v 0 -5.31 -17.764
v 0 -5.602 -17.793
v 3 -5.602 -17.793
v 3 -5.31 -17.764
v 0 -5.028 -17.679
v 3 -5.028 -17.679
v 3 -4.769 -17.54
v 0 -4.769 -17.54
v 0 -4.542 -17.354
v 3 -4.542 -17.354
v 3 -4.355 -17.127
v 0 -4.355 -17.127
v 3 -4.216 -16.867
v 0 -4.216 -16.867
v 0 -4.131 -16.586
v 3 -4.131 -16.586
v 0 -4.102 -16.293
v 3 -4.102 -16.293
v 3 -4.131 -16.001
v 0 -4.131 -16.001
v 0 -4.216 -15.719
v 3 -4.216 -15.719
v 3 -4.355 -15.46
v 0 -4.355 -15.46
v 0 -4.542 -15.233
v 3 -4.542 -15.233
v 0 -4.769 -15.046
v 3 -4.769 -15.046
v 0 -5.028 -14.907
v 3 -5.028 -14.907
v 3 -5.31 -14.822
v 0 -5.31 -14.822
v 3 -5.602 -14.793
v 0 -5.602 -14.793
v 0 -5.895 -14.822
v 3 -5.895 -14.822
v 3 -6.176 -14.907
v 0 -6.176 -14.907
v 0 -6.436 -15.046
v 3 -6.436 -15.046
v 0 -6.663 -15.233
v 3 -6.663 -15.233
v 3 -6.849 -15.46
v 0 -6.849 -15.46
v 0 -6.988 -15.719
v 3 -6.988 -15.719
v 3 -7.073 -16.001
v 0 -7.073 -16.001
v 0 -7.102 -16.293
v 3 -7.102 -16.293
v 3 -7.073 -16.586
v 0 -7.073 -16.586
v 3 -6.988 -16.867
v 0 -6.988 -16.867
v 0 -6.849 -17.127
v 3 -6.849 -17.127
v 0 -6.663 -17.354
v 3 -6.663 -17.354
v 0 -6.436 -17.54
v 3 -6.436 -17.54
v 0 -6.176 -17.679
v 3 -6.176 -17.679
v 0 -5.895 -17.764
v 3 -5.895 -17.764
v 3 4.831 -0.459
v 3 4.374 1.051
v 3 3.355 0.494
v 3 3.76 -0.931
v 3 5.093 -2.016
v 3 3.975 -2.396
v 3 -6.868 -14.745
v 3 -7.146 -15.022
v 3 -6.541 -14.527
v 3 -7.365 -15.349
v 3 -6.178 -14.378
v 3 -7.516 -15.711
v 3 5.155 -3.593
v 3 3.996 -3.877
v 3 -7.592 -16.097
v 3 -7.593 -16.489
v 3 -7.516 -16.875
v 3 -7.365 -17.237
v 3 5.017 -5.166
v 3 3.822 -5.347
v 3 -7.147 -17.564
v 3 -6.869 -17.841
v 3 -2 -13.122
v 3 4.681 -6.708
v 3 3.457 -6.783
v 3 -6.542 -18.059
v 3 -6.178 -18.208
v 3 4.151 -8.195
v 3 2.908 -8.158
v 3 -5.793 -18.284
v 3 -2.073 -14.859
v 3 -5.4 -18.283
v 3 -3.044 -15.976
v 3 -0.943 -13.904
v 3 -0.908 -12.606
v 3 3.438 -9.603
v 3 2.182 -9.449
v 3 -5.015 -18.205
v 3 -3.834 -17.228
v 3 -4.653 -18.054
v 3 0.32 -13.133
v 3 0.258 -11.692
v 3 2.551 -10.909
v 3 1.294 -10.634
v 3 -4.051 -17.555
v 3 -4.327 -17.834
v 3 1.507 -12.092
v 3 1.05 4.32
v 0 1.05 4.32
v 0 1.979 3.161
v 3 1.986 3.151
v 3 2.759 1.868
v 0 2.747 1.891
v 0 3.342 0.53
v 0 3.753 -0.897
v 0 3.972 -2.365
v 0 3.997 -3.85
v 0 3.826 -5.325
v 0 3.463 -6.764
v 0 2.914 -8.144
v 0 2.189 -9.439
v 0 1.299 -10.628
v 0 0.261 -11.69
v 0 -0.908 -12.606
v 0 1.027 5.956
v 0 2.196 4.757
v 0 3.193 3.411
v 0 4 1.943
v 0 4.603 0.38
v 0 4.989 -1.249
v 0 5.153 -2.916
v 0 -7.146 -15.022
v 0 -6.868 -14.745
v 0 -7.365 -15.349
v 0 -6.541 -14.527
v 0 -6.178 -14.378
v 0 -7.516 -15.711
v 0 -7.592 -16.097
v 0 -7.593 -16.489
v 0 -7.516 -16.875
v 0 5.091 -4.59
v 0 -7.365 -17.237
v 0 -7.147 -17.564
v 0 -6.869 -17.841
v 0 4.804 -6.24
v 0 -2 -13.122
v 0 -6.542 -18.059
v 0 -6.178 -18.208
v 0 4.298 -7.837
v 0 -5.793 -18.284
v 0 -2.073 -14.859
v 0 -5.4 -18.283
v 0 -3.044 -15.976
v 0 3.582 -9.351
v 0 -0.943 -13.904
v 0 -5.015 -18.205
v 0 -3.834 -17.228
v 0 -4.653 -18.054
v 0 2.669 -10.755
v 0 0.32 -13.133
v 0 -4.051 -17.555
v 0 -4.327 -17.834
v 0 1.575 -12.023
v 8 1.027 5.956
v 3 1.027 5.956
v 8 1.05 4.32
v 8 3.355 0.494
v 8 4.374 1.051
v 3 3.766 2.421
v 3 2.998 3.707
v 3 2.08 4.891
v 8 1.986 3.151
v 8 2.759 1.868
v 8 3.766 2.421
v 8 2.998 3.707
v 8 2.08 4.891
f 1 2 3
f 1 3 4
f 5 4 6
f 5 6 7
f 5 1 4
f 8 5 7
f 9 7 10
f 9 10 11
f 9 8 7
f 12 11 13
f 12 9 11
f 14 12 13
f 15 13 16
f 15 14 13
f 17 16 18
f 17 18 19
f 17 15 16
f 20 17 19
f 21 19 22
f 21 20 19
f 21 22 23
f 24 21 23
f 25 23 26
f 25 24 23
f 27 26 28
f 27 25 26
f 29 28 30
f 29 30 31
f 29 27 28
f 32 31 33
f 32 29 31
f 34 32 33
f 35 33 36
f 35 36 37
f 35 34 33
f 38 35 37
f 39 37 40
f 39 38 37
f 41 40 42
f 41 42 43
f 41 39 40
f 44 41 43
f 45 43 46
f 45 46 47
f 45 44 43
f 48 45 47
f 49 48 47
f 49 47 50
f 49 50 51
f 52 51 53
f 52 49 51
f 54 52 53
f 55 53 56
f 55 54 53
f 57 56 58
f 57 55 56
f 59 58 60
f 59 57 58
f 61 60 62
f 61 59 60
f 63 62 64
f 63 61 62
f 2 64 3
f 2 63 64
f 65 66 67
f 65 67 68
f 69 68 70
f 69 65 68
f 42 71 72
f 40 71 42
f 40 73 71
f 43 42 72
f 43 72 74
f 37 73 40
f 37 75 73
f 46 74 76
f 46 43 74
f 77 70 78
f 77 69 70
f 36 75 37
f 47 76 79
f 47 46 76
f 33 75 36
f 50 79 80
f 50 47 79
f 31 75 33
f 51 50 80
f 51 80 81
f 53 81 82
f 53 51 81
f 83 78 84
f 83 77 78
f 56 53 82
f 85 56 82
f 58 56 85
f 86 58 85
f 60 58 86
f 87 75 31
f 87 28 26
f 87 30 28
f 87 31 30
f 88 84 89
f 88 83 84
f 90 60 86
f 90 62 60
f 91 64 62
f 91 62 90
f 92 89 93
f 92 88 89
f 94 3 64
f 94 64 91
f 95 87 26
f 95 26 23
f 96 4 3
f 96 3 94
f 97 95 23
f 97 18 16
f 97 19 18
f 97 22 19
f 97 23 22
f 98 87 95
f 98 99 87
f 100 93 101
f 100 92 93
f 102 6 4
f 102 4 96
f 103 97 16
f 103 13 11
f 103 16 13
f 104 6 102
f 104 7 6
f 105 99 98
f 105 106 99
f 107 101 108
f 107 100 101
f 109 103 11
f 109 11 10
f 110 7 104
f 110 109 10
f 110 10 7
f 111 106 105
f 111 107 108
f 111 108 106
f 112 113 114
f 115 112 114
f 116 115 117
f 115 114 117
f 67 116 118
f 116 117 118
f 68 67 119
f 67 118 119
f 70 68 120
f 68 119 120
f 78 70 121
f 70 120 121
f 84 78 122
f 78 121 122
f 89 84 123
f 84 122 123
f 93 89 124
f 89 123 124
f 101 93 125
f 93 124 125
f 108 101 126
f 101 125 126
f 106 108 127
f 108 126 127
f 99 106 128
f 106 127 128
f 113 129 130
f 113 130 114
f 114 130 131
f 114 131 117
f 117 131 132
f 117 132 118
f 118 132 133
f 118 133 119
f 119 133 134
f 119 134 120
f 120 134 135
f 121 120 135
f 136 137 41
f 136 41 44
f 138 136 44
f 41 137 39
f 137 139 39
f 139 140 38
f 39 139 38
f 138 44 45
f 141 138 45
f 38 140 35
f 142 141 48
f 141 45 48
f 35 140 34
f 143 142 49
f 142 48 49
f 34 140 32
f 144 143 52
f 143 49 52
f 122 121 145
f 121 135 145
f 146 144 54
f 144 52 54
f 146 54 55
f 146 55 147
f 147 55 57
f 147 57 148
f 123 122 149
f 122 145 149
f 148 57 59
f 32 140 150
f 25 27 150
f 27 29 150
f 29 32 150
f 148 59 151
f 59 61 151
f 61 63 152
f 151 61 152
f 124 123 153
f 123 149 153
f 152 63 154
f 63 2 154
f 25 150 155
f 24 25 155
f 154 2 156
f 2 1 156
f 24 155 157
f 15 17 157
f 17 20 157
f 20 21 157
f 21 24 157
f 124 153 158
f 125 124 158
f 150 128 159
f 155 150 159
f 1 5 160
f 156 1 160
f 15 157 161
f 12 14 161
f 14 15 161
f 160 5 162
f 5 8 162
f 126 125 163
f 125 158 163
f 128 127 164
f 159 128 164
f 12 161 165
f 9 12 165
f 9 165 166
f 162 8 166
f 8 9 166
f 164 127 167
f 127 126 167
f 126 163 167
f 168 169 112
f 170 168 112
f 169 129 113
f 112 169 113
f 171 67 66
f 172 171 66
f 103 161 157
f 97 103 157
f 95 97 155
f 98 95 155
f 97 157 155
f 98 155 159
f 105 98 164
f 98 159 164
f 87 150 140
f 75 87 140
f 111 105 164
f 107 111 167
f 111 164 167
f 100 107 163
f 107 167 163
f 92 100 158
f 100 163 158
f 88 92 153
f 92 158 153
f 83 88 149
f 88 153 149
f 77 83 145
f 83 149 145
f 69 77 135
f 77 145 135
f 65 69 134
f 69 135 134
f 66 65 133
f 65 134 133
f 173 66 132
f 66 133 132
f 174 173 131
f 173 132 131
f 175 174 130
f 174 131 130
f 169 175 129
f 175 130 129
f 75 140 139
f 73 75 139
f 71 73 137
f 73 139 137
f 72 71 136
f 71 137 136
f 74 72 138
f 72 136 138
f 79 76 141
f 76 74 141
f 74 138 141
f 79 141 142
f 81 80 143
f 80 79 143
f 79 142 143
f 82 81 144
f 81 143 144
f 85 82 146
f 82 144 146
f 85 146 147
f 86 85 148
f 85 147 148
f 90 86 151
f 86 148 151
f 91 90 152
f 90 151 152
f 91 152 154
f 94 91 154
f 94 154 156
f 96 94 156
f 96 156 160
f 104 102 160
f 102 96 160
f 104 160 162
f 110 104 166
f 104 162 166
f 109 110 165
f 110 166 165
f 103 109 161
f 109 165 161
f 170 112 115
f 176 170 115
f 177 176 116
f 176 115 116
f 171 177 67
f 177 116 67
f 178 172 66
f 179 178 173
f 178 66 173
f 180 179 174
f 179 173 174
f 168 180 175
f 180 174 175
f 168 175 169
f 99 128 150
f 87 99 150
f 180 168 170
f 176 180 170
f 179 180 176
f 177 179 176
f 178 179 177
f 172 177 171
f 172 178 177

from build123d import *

# Parameters (mm, degrees)
SKETCH8_R           = 1.5
BOSS_EXTRUDE3_DEPTH = 3
BOSS_EXTRUDE4_DEPTH = 5


with BuildPart() as part:
    # Sketch8 → Boss-Extrude3 (new body)
    with BuildSketch(Plane(origin=(0, 0, 0), x_dir=(0, 0, -1), z_dir=(1, 0, 0))):
        with BuildLine():
            ThreePointArc((13.132863069, 0.320027848), (3.75419069, 5.150346209), (-5.956033277, 1.026874177))
            Line((-5.956033277, 1.026874177), (-4.319797484, 1.050447619))
            ThreePointArc((-4.319797484, 1.050447619), (4.590085283, 3.936033014), (12.605766771, -0.907670556))
            Line((12.605766771, -0.907670556), (13.12184584, -1.999779955))
            Line((13.12184584, -1.999779955), (14.377901927, -6.177963459))
            ThreePointArc((14.377901927, -6.177963459), (17.56376003, -7.146759051), (17.227616297, -3.83386543))
            ThreePointArc((17.227616297, -3.83386543), (14.859483295, -2.073108487), (13.132863069, 0.320027848))
        make_face()
        with Locations((16.293226017, -5.602173889)):
            Circle(SKETCH8_R, mode=Mode.SUBTRACT)
    extrude(amount=BOSS_EXTRUDE3_DEPTH)

    # Sketch10 → Boss-Extrude4 (add)
    with BuildSketch(Plane(origin=(3, 0, 0), x_dir=(0, 0, -1), z_dir=(1, 0, 0))):
        with BuildLine():
            Line((-5.956033277, 1.026874177), (-4.319797484, 1.050447619))
            ThreePointArc((-4.319797484, 1.050447619), (-2.522150549, 2.39412043), (-0.493946712, 3.355047235))
            Line((-0.493946712, 3.355047235), (-1.051379481, 4.37374771))
            ThreePointArc((-1.051379481, 4.37374771), (-3.706640914, 2.997700023), (-5.956033277, 1.026874177))
        make_face()
    extrude(amount=BOSS_EXTRUDE4_DEPTH)


solid = part.part
